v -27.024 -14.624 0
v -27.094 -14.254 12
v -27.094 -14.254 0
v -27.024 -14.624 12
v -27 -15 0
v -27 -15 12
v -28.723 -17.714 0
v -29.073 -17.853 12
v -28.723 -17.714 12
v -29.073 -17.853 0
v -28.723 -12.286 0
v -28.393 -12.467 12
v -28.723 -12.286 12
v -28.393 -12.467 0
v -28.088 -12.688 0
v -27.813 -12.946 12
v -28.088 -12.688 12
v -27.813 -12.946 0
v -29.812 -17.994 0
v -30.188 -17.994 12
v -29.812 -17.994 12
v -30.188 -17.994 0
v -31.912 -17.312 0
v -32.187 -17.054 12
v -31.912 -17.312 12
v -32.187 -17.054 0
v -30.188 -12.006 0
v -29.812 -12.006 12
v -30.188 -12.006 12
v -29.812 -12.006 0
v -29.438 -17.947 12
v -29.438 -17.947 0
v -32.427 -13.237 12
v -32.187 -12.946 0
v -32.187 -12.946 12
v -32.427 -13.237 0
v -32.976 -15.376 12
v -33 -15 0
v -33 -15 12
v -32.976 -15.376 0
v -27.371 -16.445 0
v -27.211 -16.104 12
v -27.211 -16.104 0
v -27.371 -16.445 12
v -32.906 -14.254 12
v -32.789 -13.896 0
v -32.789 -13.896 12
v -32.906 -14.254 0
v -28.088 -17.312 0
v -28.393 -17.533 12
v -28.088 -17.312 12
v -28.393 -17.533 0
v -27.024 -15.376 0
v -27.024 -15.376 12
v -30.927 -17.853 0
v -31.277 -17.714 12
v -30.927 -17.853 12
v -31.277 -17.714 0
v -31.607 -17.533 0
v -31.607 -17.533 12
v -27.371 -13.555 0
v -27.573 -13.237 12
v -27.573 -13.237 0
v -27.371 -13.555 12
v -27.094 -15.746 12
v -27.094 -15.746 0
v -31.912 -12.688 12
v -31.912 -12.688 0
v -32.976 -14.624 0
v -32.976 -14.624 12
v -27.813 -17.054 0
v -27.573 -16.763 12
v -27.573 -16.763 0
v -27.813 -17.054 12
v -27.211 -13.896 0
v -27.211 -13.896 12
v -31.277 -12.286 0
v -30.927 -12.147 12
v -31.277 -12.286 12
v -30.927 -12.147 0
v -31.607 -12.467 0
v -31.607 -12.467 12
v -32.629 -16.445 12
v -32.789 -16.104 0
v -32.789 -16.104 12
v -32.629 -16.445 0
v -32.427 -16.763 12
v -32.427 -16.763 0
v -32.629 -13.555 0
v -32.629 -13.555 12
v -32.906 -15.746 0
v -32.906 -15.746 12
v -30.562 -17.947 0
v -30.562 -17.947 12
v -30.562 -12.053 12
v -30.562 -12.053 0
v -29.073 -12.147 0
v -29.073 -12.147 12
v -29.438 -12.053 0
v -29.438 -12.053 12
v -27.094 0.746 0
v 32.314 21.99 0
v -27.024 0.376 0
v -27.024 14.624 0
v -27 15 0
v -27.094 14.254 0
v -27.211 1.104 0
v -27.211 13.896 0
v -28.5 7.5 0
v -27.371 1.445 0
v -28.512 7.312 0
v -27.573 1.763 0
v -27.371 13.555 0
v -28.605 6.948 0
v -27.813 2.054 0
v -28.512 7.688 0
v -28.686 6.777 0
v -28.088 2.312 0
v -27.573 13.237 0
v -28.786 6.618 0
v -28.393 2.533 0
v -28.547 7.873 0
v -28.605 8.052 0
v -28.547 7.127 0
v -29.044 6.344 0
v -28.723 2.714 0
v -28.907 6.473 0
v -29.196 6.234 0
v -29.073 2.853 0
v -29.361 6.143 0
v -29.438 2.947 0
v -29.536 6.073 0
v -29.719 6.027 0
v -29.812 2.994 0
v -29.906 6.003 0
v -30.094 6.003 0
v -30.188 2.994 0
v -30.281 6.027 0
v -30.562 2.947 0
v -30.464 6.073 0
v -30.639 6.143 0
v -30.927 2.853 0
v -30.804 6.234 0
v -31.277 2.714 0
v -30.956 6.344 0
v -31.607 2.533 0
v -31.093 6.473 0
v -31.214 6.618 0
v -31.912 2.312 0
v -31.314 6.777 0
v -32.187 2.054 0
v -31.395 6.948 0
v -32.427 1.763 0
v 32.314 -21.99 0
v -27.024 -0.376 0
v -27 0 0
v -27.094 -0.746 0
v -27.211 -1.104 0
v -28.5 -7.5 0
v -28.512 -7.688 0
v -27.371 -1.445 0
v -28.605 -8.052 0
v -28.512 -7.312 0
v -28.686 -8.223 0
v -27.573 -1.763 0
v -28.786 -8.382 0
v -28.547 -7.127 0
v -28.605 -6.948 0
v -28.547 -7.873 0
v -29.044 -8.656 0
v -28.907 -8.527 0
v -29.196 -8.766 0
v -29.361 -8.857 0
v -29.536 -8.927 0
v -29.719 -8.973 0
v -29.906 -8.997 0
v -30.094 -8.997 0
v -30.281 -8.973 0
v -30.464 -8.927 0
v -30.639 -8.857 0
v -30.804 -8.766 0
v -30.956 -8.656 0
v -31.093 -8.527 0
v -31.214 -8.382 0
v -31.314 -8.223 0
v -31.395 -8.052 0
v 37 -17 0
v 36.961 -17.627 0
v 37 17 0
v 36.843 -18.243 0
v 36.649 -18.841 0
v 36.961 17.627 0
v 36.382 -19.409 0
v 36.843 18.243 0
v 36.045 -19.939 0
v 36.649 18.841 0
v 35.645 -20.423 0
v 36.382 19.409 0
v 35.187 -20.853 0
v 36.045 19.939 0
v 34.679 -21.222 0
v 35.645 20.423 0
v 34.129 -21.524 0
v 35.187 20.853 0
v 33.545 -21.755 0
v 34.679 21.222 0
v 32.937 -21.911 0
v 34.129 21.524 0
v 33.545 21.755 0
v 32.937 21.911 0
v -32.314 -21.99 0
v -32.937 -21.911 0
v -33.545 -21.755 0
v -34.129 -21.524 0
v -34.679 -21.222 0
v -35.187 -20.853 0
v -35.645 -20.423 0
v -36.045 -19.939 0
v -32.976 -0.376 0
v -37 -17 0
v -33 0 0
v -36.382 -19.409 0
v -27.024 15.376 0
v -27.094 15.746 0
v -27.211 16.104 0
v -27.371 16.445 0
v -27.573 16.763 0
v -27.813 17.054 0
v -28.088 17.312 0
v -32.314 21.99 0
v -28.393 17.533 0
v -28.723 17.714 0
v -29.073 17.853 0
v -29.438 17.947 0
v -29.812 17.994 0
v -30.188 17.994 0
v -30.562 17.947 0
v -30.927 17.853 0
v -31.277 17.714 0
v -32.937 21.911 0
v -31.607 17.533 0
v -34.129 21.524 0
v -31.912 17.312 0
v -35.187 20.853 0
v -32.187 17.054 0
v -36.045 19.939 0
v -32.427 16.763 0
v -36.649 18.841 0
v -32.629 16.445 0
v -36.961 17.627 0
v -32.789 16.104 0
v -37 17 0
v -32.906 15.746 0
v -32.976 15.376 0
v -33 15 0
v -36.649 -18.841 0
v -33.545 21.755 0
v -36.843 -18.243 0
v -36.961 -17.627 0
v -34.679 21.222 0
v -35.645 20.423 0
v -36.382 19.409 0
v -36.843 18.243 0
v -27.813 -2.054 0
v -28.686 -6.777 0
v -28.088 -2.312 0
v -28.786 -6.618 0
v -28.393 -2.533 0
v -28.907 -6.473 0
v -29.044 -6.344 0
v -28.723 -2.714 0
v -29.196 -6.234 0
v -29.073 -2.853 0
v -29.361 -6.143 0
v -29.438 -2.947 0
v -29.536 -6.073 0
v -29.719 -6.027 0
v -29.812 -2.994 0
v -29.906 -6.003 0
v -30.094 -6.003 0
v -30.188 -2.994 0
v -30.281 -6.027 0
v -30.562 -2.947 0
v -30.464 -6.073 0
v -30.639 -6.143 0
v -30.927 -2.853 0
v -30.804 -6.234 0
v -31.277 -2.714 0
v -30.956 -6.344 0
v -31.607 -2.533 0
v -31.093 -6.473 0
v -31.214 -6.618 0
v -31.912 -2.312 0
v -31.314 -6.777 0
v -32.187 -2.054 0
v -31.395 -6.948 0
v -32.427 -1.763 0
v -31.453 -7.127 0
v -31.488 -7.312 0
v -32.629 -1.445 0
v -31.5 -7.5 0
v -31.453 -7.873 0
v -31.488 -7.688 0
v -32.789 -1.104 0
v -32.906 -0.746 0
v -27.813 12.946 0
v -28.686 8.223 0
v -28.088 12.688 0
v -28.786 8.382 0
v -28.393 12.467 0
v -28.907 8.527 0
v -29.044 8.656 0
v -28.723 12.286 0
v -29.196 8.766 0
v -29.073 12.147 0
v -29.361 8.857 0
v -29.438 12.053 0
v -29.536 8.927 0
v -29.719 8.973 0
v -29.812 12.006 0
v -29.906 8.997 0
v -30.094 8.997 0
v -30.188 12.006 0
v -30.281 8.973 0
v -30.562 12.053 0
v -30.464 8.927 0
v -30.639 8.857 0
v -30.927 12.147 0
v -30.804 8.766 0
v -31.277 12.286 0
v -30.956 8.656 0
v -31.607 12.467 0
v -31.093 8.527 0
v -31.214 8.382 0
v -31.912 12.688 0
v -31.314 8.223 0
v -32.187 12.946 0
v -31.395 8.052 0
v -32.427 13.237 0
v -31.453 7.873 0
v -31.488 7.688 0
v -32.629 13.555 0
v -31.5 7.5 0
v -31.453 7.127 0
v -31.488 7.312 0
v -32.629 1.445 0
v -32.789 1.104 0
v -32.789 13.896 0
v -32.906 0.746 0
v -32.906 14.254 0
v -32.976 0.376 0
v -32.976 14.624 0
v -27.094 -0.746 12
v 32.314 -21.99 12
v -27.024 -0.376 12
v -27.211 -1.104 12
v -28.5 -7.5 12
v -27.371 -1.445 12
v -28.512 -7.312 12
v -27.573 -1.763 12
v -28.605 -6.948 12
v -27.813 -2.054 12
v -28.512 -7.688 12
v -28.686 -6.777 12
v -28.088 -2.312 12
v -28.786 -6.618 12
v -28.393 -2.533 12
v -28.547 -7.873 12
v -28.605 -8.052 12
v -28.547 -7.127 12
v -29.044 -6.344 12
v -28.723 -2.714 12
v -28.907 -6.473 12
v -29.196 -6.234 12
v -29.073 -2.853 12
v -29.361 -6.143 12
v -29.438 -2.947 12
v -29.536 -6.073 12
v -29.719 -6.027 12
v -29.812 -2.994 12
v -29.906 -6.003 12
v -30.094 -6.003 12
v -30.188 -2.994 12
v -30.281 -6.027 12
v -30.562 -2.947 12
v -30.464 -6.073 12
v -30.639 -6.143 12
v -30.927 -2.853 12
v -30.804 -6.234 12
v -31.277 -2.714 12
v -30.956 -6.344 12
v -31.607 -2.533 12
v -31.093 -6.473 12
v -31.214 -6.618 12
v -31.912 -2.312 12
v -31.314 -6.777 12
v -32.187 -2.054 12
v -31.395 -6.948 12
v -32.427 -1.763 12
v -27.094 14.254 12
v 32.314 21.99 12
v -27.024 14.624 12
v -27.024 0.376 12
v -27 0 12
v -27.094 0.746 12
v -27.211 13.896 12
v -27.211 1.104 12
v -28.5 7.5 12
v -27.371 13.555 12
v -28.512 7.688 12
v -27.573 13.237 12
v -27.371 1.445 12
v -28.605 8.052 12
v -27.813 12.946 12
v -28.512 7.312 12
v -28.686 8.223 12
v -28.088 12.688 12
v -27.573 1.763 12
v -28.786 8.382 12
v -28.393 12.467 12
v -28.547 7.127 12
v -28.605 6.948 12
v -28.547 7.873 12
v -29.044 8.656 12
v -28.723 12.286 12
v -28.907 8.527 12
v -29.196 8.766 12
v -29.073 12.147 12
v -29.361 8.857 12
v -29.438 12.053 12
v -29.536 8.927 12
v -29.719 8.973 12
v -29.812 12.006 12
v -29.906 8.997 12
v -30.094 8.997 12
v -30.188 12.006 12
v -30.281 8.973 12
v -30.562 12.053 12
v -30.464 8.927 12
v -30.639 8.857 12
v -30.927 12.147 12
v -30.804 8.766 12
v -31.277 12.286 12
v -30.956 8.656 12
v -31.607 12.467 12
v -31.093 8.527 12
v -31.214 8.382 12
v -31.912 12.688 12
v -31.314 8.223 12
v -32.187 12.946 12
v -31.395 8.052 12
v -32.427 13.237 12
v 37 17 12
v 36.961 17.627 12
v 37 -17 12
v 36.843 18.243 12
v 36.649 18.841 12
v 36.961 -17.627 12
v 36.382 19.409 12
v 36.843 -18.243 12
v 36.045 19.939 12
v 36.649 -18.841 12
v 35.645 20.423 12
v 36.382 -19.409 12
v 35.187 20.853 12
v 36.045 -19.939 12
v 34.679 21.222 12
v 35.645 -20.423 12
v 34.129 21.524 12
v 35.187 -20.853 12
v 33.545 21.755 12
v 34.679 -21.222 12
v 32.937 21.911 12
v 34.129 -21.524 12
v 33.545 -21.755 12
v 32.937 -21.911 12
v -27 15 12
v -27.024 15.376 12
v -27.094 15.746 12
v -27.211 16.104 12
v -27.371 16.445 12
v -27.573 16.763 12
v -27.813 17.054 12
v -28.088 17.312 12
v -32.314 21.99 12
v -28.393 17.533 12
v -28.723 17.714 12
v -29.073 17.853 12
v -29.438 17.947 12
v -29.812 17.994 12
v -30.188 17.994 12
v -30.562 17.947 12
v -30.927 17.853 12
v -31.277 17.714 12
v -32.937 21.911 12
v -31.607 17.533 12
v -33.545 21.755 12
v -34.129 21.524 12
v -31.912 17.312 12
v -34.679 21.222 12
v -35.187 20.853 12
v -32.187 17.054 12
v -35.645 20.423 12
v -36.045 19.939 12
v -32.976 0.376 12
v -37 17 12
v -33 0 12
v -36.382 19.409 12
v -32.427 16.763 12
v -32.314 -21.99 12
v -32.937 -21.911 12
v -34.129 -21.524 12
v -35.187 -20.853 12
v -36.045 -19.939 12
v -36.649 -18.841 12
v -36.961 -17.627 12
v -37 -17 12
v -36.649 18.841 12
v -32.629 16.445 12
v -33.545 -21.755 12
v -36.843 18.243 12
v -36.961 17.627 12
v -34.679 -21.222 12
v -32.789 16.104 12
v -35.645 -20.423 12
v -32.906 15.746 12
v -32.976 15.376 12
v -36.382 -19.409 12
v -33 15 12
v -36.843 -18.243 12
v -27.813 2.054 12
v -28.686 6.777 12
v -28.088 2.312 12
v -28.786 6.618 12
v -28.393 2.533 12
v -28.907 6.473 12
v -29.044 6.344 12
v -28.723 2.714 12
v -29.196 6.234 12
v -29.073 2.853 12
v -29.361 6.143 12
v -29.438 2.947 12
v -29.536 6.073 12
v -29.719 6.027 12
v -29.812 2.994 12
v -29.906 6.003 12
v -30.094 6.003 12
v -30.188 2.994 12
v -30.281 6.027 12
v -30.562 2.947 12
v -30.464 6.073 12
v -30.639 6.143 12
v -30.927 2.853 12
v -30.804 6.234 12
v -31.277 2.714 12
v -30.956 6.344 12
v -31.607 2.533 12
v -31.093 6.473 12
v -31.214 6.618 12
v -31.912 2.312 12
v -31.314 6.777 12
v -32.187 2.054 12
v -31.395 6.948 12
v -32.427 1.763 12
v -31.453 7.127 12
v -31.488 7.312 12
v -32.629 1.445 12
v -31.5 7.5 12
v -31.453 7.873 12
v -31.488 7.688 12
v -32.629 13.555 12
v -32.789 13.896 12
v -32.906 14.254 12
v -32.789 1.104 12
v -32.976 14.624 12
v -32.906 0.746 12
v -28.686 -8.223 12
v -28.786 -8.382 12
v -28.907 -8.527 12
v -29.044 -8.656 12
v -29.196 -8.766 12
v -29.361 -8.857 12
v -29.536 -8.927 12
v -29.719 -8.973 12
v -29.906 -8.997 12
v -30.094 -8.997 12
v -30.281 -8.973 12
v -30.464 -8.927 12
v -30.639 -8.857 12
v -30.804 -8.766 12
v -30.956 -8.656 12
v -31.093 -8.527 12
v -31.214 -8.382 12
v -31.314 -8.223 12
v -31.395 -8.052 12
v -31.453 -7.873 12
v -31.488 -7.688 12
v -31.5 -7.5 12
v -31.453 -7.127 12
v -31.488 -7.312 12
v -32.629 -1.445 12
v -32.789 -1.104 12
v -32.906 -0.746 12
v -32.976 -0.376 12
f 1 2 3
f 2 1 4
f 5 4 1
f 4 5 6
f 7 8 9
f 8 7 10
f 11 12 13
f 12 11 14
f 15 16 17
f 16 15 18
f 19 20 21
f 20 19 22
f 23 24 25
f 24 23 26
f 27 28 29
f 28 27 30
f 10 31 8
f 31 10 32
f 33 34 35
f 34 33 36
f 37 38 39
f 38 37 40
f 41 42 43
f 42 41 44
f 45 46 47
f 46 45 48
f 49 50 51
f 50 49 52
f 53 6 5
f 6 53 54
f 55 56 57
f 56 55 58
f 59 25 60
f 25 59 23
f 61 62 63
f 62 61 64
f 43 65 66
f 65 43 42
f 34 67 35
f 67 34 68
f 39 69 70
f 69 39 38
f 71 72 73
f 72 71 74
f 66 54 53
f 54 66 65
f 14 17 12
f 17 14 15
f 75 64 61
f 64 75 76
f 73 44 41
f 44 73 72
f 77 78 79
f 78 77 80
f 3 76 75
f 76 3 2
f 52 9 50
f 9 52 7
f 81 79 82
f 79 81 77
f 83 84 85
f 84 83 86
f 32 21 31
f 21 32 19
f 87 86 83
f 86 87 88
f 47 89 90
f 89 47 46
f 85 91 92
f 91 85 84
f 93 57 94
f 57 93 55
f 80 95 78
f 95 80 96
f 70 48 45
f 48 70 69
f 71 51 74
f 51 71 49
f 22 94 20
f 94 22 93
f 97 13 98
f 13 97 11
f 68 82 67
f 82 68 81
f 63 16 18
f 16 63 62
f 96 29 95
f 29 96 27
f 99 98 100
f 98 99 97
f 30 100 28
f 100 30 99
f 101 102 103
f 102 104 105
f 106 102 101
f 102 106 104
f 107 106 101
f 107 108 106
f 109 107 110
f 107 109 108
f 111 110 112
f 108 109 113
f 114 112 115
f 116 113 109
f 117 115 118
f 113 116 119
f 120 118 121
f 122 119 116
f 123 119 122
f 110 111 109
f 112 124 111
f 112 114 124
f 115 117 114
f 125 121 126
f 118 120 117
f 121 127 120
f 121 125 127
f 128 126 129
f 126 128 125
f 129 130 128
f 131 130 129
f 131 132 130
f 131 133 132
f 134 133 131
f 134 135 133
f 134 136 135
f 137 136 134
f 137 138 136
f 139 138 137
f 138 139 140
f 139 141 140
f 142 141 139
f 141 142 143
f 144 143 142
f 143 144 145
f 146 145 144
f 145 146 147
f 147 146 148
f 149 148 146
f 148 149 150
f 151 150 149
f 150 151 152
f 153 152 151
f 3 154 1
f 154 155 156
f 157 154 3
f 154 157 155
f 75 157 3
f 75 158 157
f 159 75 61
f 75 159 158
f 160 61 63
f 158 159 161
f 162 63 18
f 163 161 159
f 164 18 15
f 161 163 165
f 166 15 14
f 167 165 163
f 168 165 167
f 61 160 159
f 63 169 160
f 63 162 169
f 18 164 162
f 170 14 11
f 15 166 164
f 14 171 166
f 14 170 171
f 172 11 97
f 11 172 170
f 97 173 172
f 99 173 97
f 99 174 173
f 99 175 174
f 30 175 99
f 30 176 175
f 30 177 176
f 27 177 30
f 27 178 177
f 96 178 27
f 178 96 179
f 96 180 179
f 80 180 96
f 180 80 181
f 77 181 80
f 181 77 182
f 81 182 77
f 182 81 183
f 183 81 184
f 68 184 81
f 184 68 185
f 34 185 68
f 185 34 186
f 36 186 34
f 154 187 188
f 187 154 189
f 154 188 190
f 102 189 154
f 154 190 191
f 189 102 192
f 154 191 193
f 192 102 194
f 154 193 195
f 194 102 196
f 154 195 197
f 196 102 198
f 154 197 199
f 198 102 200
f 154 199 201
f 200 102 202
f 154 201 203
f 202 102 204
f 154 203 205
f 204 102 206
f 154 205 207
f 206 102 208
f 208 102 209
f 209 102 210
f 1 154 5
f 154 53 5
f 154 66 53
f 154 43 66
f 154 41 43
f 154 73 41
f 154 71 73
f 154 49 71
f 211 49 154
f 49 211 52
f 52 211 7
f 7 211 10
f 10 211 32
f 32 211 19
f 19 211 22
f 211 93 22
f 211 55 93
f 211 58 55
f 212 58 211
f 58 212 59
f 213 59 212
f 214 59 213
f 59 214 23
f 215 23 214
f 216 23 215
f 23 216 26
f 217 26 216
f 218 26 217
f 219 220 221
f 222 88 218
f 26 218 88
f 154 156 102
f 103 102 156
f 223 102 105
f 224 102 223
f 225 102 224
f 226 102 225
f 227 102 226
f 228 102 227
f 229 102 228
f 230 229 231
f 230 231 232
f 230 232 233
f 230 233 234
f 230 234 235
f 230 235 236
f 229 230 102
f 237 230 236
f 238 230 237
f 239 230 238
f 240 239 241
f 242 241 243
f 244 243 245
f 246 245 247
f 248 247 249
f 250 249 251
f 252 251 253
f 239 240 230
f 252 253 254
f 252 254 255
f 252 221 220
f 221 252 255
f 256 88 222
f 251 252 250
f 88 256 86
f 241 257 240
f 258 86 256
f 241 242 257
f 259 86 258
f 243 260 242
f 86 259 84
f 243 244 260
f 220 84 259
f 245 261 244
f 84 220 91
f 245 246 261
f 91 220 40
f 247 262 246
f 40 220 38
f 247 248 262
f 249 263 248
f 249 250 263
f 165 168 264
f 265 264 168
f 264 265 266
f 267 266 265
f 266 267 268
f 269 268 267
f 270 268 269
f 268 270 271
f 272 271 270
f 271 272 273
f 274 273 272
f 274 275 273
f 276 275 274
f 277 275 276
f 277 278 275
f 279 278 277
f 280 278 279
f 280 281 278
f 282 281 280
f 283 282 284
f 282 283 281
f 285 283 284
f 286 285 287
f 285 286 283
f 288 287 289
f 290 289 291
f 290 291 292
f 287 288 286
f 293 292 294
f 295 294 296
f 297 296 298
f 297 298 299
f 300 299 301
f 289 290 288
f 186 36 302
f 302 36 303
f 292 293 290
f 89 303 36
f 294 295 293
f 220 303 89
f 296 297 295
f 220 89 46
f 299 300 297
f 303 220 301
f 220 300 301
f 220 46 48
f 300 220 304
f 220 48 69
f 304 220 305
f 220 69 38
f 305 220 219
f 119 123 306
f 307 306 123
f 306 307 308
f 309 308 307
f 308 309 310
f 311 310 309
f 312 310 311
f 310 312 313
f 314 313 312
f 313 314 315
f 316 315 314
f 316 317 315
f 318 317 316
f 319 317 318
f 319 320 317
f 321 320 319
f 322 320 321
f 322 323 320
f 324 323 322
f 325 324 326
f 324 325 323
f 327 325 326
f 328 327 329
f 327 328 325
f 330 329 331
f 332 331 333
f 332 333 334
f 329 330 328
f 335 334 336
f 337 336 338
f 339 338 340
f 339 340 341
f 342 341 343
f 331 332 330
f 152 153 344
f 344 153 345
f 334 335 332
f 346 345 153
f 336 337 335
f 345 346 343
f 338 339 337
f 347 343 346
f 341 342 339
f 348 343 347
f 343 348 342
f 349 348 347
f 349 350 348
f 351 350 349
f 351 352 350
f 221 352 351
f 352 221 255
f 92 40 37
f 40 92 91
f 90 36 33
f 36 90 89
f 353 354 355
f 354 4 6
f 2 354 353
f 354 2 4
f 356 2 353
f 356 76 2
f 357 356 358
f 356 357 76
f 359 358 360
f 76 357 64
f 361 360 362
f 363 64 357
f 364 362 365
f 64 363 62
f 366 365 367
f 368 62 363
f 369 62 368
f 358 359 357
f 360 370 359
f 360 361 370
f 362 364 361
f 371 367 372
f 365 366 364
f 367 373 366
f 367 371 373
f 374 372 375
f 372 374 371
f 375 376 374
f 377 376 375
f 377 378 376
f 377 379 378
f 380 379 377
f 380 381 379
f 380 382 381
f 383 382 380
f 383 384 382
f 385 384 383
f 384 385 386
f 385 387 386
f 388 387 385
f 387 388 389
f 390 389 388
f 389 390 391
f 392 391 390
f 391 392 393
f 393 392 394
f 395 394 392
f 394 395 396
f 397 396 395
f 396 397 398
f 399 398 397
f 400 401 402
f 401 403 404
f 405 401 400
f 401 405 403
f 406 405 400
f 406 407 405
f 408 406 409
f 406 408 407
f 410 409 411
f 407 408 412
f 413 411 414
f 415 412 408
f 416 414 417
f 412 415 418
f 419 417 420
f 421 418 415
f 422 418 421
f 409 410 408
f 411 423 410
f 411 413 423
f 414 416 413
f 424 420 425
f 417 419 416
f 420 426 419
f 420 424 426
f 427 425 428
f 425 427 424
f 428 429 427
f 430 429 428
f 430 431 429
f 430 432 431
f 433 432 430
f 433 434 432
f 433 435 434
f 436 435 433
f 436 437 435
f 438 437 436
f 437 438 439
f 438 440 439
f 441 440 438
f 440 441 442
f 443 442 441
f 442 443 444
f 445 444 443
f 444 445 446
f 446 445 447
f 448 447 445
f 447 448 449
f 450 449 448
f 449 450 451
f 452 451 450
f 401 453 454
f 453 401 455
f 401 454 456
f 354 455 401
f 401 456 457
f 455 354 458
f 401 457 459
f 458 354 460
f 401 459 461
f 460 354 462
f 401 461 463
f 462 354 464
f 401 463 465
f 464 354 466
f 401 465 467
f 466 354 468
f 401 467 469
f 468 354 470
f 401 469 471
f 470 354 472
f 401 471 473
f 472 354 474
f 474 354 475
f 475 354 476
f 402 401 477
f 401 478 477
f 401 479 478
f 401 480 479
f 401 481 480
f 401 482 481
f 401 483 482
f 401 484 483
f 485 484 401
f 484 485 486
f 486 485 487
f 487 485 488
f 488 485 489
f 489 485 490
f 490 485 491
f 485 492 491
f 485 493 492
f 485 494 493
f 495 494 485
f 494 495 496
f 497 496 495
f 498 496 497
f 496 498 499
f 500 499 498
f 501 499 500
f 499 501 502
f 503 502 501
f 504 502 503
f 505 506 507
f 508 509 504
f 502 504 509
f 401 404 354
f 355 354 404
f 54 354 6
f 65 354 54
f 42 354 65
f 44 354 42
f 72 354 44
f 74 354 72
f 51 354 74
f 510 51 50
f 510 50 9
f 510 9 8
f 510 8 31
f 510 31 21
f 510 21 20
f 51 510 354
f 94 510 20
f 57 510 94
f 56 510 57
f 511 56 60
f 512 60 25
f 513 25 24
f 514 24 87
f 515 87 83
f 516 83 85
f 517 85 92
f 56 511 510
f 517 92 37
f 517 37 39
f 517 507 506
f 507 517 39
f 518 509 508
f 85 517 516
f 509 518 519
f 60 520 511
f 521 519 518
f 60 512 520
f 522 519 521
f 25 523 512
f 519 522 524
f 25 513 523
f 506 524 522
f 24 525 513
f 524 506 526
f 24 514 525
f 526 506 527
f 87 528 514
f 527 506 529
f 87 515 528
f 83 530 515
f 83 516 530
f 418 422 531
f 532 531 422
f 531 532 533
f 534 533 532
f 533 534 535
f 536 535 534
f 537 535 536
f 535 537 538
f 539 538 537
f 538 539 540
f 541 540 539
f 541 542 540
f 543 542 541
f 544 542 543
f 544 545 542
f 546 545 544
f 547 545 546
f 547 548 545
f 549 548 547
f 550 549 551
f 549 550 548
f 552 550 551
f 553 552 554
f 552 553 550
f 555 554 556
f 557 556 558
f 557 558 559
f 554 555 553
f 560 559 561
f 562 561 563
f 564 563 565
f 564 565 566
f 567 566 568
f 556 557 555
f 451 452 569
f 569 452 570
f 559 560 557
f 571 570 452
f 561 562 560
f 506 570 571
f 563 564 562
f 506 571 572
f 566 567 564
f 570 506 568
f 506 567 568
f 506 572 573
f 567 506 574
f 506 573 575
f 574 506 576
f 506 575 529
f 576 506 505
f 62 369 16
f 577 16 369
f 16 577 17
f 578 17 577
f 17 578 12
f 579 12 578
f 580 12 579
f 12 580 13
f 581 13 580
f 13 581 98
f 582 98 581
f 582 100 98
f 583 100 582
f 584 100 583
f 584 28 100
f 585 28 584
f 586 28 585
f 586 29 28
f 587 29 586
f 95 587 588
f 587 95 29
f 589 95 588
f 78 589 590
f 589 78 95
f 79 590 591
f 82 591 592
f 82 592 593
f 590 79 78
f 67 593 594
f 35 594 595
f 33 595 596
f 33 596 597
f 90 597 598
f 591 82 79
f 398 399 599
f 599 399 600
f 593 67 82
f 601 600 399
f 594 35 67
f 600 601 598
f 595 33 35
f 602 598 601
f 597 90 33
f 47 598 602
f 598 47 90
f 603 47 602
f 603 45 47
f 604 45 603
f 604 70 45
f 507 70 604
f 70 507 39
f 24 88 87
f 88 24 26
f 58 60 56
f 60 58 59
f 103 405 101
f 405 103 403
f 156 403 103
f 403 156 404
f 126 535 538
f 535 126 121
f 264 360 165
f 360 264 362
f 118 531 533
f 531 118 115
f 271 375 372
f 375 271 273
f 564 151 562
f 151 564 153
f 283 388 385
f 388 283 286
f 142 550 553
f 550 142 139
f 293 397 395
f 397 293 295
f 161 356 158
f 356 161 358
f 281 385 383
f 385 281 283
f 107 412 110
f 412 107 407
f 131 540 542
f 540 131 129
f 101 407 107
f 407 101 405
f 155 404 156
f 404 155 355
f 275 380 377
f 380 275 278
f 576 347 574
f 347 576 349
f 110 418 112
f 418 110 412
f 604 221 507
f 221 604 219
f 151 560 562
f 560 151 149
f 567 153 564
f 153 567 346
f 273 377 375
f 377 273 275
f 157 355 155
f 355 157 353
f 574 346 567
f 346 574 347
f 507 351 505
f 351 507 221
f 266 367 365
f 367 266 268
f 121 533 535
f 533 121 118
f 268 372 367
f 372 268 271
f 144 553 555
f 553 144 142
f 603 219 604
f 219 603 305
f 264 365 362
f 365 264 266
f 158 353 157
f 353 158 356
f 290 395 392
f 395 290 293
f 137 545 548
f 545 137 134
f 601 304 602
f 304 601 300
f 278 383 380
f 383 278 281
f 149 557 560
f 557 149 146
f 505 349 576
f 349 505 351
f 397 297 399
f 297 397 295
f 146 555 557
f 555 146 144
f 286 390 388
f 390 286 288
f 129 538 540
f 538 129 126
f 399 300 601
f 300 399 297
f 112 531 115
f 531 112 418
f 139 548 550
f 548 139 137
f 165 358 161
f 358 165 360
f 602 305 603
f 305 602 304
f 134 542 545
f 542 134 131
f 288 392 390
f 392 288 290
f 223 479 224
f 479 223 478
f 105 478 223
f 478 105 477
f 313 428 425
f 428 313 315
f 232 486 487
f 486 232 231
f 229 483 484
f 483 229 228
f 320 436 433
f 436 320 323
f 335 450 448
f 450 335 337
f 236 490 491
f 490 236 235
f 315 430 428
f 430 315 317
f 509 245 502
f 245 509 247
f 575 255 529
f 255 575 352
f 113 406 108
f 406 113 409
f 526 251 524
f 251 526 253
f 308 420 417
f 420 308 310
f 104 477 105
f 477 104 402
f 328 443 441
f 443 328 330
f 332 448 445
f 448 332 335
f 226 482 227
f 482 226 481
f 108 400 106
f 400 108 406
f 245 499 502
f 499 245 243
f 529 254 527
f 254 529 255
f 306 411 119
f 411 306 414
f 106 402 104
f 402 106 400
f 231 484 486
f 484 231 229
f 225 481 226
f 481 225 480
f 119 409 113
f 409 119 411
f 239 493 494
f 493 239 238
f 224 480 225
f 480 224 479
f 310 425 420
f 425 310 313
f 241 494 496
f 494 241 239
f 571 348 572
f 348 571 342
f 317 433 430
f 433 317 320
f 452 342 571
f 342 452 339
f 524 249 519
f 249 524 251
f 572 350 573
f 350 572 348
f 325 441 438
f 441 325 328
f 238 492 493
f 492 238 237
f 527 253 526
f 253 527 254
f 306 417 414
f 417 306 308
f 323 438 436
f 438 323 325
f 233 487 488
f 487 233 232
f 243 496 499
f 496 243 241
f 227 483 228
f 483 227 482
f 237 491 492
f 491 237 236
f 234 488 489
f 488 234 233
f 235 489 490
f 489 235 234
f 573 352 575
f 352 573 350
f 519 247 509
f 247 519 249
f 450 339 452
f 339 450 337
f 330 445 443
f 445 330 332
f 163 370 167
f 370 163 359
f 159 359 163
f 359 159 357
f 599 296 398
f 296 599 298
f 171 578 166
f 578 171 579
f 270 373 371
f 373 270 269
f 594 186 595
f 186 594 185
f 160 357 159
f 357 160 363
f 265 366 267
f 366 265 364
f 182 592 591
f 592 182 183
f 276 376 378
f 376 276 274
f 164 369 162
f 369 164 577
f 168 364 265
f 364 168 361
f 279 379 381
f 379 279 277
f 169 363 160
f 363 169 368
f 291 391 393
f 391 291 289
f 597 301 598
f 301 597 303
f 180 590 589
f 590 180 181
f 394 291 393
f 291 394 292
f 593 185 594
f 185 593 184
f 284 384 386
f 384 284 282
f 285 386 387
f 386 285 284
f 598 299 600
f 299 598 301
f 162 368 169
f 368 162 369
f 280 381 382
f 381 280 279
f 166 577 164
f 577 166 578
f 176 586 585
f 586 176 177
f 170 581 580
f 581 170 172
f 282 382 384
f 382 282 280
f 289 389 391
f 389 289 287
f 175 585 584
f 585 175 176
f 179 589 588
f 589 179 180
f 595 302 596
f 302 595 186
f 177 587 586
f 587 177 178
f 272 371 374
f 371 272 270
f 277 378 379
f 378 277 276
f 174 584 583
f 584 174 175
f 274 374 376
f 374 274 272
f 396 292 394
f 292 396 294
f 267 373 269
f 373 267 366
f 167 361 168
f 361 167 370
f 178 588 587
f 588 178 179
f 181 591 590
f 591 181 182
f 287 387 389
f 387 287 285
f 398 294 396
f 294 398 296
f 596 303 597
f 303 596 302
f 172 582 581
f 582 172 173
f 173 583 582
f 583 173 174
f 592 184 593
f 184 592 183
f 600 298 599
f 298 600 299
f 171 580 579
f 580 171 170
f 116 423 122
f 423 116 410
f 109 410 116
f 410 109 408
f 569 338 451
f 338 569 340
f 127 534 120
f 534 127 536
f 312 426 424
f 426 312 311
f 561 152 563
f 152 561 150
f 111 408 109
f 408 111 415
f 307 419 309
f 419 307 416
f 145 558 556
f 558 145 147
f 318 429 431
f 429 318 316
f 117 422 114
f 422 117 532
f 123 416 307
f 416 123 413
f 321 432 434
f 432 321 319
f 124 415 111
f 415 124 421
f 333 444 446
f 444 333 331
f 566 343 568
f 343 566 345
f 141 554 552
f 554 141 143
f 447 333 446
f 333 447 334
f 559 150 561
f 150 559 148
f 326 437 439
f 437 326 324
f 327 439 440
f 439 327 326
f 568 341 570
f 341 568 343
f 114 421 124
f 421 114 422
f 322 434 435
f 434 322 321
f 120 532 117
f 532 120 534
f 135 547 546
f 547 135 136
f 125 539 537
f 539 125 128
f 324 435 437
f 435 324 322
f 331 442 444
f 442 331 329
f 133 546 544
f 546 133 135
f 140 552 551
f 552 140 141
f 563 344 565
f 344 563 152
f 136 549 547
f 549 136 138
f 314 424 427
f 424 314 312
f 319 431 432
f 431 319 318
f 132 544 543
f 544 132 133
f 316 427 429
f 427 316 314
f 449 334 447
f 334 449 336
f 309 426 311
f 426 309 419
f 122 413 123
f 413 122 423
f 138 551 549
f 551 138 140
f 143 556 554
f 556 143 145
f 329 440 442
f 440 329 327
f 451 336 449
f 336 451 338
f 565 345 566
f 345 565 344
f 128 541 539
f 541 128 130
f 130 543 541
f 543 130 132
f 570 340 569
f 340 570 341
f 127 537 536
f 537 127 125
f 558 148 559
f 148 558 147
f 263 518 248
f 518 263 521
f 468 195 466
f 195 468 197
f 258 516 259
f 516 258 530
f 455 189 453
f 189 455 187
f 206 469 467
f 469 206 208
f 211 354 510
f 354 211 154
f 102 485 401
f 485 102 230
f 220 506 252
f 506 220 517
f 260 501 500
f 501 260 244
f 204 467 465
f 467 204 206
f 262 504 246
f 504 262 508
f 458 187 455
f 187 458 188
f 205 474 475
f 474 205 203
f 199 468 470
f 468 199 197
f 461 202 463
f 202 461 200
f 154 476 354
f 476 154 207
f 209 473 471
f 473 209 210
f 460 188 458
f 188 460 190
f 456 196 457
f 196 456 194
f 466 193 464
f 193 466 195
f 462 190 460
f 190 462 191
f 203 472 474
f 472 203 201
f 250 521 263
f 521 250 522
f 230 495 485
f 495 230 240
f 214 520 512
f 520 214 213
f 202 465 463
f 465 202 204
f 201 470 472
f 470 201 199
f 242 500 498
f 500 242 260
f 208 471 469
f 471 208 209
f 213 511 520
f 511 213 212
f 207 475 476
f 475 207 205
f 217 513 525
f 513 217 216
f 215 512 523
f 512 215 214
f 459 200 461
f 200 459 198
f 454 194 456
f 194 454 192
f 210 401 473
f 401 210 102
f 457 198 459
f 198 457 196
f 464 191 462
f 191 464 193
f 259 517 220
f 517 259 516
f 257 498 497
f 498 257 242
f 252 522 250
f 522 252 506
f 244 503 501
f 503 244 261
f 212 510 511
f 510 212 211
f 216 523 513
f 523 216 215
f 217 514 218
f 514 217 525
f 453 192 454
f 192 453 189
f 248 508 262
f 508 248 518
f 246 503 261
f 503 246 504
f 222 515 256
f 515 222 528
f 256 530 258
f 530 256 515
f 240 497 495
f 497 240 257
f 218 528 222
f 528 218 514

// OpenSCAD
$fn = 50;


difference() {
	union() {
		hull() {
			translate(v = [-32.0000000000, 17.0000000000, 0]) {
				cylinder(h = 12, r = 5);
			}
			translate(v = [32.0000000000, 17.0000000000, 0]) {
				cylinder(h = 12, r = 5);
			}
			translate(v = [-32.0000000000, -17.0000000000, 0]) {
				cylinder(h = 12, r = 5);
			}
			translate(v = [32.0000000000, -17.0000000000, 0]) {
				cylinder(h = 12, r = 5);
			}
		}
	}
	union() {
		translate(v = [-30.0000000000, -15.0000000000, 0]) {
			cylinder(h = 12, r = 3.0000000000);
		}
		translate(v = [-30.0000000000, 0.0000000000, 0]) {
			cylinder(h = 12, r = 3.0000000000);
		}
		translate(v = [-30.0000000000, 15.0000000000, 0]) {
			cylinder(h = 12, r = 3.0000000000);
		}
		translate(v = [-30.0000000000, -15.0000000000, 0]) {
			cylinder(h = 12, r = 1.5000000000);
		}
		translate(v = [-30.0000000000, -7.5000000000, 0]) {
			cylinder(h = 12, r = 1.5000000000);
		}
		translate(v = [-30.0000000000, 0.0000000000, 0]) {
			cylinder(h = 12, r = 1.5000000000);
		}
		translate(v = [-30.0000000000, 7.5000000000, 0]) {
			cylinder(h = 12, r = 1.5000000000);
		}
		translate(v = [-30.0000000000, 15.0000000000, 0]) {
			cylinder(h = 12, r = 1.5000000000);
		}
		translate(v = [-30.0000000000, -15.0000000000, 0]) {
			cylinder(h = 12, r = 1.5000000000);
		}
		translate(v = [-30.0000000000, -7.5000000000, 0]) {
			cylinder(h = 12, r = 1.5000000000);
		}
		translate(v = [-30.0000000000, 0.0000000000, 0]) {
			cylinder(h = 12, r = 1.5000000000);
		}
		translate(v = [-30.0000000000, 7.5000000000, 0]) {
			cylinder(h = 12, r = 1.5000000000);
		}
		translate(v = [-30.0000000000, 15.0000000000, 0]) {
			cylinder(h = 12, r = 1.5000000000);
		}
		translate(v = [-30.0000000000, -15.0000000000, 0]) {
			cylinder(h = 12, r = 1.5000000000);
		}
		translate(v = [-30.0000000000, -7.5000000000, 0]) {
			cylinder(h = 12, r = 1.5000000000);
		}
		translate(v = [-30.0000000000, 0.0000000000, 0]) {
			cylinder(h = 12, r = 1.5000000000);
		}
		translate(v = [-30.0000000000, 7.5000000000, 0]) {
			cylinder(h = 12, r = 1.5000000000);
		}
		translate(v = [-30.0000000000, 15.0000000000, 0]) {
			cylinder(h = 12, r = 1.5000000000);
		}
	}
}
